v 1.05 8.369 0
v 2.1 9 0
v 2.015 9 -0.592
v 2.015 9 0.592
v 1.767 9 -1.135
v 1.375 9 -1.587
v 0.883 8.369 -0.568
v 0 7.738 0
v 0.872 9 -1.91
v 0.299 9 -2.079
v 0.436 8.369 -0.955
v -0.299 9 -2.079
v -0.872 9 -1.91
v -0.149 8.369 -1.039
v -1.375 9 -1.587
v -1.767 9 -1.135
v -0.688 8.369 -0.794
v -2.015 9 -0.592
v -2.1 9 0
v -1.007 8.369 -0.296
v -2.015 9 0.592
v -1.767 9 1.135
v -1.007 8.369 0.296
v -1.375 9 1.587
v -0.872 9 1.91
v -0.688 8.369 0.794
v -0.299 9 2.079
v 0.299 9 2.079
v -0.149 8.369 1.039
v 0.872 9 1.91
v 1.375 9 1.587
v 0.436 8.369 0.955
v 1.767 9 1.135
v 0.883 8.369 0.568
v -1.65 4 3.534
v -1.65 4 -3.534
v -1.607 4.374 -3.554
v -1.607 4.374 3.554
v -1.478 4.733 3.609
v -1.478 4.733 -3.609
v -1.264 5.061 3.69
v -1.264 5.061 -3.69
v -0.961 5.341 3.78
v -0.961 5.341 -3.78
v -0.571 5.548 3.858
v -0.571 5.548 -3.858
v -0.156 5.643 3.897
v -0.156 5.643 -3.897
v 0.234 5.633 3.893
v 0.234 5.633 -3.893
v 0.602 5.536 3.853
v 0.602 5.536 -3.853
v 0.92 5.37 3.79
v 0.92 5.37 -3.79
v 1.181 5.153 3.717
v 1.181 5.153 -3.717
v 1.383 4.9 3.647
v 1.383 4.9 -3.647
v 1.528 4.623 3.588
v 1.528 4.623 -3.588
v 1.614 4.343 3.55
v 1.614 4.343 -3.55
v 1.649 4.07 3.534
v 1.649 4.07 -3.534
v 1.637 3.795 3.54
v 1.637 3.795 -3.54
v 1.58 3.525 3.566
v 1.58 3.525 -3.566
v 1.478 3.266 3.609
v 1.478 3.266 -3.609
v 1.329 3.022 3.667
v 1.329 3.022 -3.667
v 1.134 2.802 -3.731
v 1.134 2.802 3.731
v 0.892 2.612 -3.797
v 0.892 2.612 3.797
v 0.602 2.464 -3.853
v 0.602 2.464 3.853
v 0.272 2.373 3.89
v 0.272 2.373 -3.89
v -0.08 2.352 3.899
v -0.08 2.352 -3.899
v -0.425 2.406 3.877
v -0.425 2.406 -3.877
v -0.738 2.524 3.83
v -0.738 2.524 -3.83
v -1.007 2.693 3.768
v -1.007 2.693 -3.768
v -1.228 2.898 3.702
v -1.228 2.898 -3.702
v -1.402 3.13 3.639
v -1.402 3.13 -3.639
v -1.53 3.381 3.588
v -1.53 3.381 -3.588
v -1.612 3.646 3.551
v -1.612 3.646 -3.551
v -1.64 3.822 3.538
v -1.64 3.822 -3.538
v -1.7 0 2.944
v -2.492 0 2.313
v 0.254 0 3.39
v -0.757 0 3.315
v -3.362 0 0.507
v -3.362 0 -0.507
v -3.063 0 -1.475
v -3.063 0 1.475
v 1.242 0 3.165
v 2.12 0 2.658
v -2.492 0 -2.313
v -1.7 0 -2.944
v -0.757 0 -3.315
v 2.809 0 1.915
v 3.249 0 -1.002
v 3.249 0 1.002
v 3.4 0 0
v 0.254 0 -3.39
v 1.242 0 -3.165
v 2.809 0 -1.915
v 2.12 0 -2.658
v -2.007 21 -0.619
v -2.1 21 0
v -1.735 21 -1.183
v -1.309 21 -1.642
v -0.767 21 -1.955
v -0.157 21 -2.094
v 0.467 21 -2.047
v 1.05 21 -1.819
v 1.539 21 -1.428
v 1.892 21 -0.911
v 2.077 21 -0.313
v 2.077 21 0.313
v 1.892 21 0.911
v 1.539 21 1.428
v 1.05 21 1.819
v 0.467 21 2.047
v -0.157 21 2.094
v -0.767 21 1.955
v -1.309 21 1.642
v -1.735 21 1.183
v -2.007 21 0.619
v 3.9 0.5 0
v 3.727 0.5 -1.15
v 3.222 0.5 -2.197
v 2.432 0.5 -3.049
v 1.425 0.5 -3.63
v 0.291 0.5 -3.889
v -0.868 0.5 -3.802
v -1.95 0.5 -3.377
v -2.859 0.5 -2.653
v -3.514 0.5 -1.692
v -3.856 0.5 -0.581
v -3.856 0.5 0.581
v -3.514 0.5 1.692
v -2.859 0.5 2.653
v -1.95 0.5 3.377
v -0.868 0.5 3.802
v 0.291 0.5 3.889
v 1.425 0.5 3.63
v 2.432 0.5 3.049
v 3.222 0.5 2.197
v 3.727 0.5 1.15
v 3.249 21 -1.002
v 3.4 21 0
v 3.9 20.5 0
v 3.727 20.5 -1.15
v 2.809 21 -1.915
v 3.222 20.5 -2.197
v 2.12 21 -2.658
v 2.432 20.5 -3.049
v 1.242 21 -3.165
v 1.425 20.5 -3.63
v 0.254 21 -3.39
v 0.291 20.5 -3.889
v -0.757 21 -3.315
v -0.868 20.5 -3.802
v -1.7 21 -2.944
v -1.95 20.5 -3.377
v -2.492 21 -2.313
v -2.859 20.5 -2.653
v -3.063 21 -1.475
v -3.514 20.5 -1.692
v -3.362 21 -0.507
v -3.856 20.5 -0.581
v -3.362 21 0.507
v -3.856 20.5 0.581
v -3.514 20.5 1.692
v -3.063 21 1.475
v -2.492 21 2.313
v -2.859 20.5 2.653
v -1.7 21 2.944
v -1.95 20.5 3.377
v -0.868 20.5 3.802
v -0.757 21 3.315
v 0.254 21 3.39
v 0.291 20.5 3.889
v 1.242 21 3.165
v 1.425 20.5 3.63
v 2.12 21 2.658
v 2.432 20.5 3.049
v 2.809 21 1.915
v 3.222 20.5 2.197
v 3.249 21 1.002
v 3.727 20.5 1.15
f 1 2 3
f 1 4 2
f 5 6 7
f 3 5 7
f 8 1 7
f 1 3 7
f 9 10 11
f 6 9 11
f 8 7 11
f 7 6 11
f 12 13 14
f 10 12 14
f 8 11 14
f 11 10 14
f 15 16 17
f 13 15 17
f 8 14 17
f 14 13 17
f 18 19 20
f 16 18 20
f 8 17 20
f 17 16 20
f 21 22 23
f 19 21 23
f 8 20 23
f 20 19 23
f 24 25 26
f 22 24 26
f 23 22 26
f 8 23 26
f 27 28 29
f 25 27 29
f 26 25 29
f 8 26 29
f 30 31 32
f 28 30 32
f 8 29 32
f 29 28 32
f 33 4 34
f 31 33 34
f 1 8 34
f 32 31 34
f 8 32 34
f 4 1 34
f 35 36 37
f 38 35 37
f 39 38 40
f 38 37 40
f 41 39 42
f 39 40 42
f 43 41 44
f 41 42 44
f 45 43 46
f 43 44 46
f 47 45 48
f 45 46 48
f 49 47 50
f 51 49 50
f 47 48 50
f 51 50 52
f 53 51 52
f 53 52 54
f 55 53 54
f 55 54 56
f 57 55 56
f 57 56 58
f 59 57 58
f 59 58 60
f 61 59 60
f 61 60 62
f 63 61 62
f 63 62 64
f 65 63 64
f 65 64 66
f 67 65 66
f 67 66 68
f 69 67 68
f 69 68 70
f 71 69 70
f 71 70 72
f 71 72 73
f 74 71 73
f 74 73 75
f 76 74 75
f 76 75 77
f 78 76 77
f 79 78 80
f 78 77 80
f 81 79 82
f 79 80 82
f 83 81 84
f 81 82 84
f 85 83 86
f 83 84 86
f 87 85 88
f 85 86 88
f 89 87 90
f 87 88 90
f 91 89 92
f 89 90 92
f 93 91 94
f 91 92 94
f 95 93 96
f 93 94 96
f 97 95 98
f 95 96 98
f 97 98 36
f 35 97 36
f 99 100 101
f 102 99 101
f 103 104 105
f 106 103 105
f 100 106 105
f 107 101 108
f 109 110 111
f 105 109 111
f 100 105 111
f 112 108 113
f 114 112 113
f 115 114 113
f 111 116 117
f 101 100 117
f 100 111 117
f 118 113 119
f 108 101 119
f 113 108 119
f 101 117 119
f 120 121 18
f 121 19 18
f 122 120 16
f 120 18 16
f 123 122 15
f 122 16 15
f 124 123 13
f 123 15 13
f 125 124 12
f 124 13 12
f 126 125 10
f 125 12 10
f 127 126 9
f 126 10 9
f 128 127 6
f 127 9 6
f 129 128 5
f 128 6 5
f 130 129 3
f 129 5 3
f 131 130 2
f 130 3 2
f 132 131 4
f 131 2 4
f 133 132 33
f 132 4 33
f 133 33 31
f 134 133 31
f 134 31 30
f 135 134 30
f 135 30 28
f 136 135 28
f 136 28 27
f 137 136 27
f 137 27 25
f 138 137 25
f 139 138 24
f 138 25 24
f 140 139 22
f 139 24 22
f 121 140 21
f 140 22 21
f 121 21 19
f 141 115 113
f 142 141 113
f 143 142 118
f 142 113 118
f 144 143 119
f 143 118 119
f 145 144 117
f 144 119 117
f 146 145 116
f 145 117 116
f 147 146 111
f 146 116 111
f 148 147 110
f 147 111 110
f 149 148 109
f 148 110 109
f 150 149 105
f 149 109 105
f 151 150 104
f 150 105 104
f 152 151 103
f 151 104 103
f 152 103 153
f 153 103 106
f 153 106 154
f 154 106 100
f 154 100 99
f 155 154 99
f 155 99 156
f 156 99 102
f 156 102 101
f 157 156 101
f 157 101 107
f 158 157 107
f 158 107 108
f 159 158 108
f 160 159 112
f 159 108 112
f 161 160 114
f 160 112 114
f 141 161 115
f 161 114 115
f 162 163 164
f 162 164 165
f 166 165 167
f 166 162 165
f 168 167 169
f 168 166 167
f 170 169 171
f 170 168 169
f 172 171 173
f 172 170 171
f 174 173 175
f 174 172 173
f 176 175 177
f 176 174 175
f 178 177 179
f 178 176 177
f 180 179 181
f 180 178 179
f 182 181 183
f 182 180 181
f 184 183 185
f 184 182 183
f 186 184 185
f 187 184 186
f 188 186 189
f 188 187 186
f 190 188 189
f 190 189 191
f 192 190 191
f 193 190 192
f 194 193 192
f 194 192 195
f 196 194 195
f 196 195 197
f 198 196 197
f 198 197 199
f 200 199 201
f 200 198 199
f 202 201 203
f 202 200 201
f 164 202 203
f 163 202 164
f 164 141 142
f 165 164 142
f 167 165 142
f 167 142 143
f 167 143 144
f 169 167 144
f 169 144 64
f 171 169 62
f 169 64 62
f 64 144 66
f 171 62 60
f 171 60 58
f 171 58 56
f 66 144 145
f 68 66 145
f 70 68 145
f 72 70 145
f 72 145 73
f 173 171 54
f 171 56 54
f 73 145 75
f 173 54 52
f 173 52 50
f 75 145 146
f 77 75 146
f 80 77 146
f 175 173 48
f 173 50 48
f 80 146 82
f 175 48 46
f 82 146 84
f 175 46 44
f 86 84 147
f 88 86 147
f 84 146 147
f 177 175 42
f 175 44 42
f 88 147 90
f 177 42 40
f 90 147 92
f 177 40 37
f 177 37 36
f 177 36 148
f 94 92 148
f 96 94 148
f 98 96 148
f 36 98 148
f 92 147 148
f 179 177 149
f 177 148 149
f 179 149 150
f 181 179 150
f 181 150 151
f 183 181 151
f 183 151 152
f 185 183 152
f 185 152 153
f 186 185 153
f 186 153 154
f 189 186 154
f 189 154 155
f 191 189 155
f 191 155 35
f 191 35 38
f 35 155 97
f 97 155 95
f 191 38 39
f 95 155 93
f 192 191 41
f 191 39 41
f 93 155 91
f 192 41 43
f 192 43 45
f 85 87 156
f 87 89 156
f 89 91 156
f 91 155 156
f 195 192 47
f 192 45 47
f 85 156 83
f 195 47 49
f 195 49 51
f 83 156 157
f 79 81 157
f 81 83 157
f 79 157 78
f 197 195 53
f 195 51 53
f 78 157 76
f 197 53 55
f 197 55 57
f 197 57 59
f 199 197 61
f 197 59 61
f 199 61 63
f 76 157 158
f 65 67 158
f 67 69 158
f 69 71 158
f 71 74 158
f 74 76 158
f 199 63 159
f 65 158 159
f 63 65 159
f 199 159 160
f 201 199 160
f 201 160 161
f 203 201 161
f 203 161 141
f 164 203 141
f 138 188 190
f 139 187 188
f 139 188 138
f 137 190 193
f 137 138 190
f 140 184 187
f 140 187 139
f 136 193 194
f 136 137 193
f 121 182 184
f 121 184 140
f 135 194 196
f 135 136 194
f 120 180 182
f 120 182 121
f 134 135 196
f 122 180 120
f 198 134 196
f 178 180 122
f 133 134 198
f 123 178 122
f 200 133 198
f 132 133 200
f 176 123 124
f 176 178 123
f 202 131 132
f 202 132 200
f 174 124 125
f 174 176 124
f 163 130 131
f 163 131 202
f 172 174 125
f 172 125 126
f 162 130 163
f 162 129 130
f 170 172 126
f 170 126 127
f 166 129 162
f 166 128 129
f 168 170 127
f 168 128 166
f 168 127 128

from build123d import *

# Parameters (mm, degrees)
SKETCH_1_R             = 3.9
EXTRUDE_1_DEPTH        = 21
HOLE_WIZARD_M4_1_D     = 3.3
HOLE_WIZARD_M5_1_D     = 4.2
HOLE_WIZARD_M5_1_DEPTH = 12
HOLE_WIZARD_M5_1_TIP   = 1.2618073
CHAMFER_1_SIZE         = 0.5


with BuildPart() as part:
    # 草图1 → 凸台-拉伸1 (new body)
    with BuildSketch(Plane(origin=(0, 0, 0), x_dir=(1, 0, 0), z_dir=(0, 1, 0))):
        Circle(SKETCH_1_R)
    extrude(amount=EXTRUDE_1_DEPTH)

    # M4 螺纹孔1 (through all)
    with Locations(Plane.XY.offset(3.9)):
        with Locations((0, 4)):
            Hole(HOLE_WIZARD_M4_1_D / 2)

    # M5 螺纹孔1
    with Locations(Plane(origin=(0, 21, 0), x_dir=(1, 0, 0), z_dir=(0, 1, 0))):
        with Locations((0, 0)):
            Hole(HOLE_WIZARD_M5_1_D / 2, depth=HOLE_WIZARD_M5_1_DEPTH)
            with Locations((0, 0, -(HOLE_WIZARD_M5_1_DEPTH + HOLE_WIZARD_M5_1_TIP / 2))):  # 118° drill point
                Cone(0, HOLE_WIZARD_M5_1_D / 2, HOLE_WIZARD_M5_1_TIP, mode=Mode.SUBTRACT)

    # 倒角1
    chamfer_1_edges = [part.edges().sort_by_distance(p)[0] for p in [
        (-3.9, 0, 0),
        (-3.9, 21, 0),
    ]]
    chamfer(chamfer_1_edges, length=CHAMFER_1_SIZE)


solid = part.part
